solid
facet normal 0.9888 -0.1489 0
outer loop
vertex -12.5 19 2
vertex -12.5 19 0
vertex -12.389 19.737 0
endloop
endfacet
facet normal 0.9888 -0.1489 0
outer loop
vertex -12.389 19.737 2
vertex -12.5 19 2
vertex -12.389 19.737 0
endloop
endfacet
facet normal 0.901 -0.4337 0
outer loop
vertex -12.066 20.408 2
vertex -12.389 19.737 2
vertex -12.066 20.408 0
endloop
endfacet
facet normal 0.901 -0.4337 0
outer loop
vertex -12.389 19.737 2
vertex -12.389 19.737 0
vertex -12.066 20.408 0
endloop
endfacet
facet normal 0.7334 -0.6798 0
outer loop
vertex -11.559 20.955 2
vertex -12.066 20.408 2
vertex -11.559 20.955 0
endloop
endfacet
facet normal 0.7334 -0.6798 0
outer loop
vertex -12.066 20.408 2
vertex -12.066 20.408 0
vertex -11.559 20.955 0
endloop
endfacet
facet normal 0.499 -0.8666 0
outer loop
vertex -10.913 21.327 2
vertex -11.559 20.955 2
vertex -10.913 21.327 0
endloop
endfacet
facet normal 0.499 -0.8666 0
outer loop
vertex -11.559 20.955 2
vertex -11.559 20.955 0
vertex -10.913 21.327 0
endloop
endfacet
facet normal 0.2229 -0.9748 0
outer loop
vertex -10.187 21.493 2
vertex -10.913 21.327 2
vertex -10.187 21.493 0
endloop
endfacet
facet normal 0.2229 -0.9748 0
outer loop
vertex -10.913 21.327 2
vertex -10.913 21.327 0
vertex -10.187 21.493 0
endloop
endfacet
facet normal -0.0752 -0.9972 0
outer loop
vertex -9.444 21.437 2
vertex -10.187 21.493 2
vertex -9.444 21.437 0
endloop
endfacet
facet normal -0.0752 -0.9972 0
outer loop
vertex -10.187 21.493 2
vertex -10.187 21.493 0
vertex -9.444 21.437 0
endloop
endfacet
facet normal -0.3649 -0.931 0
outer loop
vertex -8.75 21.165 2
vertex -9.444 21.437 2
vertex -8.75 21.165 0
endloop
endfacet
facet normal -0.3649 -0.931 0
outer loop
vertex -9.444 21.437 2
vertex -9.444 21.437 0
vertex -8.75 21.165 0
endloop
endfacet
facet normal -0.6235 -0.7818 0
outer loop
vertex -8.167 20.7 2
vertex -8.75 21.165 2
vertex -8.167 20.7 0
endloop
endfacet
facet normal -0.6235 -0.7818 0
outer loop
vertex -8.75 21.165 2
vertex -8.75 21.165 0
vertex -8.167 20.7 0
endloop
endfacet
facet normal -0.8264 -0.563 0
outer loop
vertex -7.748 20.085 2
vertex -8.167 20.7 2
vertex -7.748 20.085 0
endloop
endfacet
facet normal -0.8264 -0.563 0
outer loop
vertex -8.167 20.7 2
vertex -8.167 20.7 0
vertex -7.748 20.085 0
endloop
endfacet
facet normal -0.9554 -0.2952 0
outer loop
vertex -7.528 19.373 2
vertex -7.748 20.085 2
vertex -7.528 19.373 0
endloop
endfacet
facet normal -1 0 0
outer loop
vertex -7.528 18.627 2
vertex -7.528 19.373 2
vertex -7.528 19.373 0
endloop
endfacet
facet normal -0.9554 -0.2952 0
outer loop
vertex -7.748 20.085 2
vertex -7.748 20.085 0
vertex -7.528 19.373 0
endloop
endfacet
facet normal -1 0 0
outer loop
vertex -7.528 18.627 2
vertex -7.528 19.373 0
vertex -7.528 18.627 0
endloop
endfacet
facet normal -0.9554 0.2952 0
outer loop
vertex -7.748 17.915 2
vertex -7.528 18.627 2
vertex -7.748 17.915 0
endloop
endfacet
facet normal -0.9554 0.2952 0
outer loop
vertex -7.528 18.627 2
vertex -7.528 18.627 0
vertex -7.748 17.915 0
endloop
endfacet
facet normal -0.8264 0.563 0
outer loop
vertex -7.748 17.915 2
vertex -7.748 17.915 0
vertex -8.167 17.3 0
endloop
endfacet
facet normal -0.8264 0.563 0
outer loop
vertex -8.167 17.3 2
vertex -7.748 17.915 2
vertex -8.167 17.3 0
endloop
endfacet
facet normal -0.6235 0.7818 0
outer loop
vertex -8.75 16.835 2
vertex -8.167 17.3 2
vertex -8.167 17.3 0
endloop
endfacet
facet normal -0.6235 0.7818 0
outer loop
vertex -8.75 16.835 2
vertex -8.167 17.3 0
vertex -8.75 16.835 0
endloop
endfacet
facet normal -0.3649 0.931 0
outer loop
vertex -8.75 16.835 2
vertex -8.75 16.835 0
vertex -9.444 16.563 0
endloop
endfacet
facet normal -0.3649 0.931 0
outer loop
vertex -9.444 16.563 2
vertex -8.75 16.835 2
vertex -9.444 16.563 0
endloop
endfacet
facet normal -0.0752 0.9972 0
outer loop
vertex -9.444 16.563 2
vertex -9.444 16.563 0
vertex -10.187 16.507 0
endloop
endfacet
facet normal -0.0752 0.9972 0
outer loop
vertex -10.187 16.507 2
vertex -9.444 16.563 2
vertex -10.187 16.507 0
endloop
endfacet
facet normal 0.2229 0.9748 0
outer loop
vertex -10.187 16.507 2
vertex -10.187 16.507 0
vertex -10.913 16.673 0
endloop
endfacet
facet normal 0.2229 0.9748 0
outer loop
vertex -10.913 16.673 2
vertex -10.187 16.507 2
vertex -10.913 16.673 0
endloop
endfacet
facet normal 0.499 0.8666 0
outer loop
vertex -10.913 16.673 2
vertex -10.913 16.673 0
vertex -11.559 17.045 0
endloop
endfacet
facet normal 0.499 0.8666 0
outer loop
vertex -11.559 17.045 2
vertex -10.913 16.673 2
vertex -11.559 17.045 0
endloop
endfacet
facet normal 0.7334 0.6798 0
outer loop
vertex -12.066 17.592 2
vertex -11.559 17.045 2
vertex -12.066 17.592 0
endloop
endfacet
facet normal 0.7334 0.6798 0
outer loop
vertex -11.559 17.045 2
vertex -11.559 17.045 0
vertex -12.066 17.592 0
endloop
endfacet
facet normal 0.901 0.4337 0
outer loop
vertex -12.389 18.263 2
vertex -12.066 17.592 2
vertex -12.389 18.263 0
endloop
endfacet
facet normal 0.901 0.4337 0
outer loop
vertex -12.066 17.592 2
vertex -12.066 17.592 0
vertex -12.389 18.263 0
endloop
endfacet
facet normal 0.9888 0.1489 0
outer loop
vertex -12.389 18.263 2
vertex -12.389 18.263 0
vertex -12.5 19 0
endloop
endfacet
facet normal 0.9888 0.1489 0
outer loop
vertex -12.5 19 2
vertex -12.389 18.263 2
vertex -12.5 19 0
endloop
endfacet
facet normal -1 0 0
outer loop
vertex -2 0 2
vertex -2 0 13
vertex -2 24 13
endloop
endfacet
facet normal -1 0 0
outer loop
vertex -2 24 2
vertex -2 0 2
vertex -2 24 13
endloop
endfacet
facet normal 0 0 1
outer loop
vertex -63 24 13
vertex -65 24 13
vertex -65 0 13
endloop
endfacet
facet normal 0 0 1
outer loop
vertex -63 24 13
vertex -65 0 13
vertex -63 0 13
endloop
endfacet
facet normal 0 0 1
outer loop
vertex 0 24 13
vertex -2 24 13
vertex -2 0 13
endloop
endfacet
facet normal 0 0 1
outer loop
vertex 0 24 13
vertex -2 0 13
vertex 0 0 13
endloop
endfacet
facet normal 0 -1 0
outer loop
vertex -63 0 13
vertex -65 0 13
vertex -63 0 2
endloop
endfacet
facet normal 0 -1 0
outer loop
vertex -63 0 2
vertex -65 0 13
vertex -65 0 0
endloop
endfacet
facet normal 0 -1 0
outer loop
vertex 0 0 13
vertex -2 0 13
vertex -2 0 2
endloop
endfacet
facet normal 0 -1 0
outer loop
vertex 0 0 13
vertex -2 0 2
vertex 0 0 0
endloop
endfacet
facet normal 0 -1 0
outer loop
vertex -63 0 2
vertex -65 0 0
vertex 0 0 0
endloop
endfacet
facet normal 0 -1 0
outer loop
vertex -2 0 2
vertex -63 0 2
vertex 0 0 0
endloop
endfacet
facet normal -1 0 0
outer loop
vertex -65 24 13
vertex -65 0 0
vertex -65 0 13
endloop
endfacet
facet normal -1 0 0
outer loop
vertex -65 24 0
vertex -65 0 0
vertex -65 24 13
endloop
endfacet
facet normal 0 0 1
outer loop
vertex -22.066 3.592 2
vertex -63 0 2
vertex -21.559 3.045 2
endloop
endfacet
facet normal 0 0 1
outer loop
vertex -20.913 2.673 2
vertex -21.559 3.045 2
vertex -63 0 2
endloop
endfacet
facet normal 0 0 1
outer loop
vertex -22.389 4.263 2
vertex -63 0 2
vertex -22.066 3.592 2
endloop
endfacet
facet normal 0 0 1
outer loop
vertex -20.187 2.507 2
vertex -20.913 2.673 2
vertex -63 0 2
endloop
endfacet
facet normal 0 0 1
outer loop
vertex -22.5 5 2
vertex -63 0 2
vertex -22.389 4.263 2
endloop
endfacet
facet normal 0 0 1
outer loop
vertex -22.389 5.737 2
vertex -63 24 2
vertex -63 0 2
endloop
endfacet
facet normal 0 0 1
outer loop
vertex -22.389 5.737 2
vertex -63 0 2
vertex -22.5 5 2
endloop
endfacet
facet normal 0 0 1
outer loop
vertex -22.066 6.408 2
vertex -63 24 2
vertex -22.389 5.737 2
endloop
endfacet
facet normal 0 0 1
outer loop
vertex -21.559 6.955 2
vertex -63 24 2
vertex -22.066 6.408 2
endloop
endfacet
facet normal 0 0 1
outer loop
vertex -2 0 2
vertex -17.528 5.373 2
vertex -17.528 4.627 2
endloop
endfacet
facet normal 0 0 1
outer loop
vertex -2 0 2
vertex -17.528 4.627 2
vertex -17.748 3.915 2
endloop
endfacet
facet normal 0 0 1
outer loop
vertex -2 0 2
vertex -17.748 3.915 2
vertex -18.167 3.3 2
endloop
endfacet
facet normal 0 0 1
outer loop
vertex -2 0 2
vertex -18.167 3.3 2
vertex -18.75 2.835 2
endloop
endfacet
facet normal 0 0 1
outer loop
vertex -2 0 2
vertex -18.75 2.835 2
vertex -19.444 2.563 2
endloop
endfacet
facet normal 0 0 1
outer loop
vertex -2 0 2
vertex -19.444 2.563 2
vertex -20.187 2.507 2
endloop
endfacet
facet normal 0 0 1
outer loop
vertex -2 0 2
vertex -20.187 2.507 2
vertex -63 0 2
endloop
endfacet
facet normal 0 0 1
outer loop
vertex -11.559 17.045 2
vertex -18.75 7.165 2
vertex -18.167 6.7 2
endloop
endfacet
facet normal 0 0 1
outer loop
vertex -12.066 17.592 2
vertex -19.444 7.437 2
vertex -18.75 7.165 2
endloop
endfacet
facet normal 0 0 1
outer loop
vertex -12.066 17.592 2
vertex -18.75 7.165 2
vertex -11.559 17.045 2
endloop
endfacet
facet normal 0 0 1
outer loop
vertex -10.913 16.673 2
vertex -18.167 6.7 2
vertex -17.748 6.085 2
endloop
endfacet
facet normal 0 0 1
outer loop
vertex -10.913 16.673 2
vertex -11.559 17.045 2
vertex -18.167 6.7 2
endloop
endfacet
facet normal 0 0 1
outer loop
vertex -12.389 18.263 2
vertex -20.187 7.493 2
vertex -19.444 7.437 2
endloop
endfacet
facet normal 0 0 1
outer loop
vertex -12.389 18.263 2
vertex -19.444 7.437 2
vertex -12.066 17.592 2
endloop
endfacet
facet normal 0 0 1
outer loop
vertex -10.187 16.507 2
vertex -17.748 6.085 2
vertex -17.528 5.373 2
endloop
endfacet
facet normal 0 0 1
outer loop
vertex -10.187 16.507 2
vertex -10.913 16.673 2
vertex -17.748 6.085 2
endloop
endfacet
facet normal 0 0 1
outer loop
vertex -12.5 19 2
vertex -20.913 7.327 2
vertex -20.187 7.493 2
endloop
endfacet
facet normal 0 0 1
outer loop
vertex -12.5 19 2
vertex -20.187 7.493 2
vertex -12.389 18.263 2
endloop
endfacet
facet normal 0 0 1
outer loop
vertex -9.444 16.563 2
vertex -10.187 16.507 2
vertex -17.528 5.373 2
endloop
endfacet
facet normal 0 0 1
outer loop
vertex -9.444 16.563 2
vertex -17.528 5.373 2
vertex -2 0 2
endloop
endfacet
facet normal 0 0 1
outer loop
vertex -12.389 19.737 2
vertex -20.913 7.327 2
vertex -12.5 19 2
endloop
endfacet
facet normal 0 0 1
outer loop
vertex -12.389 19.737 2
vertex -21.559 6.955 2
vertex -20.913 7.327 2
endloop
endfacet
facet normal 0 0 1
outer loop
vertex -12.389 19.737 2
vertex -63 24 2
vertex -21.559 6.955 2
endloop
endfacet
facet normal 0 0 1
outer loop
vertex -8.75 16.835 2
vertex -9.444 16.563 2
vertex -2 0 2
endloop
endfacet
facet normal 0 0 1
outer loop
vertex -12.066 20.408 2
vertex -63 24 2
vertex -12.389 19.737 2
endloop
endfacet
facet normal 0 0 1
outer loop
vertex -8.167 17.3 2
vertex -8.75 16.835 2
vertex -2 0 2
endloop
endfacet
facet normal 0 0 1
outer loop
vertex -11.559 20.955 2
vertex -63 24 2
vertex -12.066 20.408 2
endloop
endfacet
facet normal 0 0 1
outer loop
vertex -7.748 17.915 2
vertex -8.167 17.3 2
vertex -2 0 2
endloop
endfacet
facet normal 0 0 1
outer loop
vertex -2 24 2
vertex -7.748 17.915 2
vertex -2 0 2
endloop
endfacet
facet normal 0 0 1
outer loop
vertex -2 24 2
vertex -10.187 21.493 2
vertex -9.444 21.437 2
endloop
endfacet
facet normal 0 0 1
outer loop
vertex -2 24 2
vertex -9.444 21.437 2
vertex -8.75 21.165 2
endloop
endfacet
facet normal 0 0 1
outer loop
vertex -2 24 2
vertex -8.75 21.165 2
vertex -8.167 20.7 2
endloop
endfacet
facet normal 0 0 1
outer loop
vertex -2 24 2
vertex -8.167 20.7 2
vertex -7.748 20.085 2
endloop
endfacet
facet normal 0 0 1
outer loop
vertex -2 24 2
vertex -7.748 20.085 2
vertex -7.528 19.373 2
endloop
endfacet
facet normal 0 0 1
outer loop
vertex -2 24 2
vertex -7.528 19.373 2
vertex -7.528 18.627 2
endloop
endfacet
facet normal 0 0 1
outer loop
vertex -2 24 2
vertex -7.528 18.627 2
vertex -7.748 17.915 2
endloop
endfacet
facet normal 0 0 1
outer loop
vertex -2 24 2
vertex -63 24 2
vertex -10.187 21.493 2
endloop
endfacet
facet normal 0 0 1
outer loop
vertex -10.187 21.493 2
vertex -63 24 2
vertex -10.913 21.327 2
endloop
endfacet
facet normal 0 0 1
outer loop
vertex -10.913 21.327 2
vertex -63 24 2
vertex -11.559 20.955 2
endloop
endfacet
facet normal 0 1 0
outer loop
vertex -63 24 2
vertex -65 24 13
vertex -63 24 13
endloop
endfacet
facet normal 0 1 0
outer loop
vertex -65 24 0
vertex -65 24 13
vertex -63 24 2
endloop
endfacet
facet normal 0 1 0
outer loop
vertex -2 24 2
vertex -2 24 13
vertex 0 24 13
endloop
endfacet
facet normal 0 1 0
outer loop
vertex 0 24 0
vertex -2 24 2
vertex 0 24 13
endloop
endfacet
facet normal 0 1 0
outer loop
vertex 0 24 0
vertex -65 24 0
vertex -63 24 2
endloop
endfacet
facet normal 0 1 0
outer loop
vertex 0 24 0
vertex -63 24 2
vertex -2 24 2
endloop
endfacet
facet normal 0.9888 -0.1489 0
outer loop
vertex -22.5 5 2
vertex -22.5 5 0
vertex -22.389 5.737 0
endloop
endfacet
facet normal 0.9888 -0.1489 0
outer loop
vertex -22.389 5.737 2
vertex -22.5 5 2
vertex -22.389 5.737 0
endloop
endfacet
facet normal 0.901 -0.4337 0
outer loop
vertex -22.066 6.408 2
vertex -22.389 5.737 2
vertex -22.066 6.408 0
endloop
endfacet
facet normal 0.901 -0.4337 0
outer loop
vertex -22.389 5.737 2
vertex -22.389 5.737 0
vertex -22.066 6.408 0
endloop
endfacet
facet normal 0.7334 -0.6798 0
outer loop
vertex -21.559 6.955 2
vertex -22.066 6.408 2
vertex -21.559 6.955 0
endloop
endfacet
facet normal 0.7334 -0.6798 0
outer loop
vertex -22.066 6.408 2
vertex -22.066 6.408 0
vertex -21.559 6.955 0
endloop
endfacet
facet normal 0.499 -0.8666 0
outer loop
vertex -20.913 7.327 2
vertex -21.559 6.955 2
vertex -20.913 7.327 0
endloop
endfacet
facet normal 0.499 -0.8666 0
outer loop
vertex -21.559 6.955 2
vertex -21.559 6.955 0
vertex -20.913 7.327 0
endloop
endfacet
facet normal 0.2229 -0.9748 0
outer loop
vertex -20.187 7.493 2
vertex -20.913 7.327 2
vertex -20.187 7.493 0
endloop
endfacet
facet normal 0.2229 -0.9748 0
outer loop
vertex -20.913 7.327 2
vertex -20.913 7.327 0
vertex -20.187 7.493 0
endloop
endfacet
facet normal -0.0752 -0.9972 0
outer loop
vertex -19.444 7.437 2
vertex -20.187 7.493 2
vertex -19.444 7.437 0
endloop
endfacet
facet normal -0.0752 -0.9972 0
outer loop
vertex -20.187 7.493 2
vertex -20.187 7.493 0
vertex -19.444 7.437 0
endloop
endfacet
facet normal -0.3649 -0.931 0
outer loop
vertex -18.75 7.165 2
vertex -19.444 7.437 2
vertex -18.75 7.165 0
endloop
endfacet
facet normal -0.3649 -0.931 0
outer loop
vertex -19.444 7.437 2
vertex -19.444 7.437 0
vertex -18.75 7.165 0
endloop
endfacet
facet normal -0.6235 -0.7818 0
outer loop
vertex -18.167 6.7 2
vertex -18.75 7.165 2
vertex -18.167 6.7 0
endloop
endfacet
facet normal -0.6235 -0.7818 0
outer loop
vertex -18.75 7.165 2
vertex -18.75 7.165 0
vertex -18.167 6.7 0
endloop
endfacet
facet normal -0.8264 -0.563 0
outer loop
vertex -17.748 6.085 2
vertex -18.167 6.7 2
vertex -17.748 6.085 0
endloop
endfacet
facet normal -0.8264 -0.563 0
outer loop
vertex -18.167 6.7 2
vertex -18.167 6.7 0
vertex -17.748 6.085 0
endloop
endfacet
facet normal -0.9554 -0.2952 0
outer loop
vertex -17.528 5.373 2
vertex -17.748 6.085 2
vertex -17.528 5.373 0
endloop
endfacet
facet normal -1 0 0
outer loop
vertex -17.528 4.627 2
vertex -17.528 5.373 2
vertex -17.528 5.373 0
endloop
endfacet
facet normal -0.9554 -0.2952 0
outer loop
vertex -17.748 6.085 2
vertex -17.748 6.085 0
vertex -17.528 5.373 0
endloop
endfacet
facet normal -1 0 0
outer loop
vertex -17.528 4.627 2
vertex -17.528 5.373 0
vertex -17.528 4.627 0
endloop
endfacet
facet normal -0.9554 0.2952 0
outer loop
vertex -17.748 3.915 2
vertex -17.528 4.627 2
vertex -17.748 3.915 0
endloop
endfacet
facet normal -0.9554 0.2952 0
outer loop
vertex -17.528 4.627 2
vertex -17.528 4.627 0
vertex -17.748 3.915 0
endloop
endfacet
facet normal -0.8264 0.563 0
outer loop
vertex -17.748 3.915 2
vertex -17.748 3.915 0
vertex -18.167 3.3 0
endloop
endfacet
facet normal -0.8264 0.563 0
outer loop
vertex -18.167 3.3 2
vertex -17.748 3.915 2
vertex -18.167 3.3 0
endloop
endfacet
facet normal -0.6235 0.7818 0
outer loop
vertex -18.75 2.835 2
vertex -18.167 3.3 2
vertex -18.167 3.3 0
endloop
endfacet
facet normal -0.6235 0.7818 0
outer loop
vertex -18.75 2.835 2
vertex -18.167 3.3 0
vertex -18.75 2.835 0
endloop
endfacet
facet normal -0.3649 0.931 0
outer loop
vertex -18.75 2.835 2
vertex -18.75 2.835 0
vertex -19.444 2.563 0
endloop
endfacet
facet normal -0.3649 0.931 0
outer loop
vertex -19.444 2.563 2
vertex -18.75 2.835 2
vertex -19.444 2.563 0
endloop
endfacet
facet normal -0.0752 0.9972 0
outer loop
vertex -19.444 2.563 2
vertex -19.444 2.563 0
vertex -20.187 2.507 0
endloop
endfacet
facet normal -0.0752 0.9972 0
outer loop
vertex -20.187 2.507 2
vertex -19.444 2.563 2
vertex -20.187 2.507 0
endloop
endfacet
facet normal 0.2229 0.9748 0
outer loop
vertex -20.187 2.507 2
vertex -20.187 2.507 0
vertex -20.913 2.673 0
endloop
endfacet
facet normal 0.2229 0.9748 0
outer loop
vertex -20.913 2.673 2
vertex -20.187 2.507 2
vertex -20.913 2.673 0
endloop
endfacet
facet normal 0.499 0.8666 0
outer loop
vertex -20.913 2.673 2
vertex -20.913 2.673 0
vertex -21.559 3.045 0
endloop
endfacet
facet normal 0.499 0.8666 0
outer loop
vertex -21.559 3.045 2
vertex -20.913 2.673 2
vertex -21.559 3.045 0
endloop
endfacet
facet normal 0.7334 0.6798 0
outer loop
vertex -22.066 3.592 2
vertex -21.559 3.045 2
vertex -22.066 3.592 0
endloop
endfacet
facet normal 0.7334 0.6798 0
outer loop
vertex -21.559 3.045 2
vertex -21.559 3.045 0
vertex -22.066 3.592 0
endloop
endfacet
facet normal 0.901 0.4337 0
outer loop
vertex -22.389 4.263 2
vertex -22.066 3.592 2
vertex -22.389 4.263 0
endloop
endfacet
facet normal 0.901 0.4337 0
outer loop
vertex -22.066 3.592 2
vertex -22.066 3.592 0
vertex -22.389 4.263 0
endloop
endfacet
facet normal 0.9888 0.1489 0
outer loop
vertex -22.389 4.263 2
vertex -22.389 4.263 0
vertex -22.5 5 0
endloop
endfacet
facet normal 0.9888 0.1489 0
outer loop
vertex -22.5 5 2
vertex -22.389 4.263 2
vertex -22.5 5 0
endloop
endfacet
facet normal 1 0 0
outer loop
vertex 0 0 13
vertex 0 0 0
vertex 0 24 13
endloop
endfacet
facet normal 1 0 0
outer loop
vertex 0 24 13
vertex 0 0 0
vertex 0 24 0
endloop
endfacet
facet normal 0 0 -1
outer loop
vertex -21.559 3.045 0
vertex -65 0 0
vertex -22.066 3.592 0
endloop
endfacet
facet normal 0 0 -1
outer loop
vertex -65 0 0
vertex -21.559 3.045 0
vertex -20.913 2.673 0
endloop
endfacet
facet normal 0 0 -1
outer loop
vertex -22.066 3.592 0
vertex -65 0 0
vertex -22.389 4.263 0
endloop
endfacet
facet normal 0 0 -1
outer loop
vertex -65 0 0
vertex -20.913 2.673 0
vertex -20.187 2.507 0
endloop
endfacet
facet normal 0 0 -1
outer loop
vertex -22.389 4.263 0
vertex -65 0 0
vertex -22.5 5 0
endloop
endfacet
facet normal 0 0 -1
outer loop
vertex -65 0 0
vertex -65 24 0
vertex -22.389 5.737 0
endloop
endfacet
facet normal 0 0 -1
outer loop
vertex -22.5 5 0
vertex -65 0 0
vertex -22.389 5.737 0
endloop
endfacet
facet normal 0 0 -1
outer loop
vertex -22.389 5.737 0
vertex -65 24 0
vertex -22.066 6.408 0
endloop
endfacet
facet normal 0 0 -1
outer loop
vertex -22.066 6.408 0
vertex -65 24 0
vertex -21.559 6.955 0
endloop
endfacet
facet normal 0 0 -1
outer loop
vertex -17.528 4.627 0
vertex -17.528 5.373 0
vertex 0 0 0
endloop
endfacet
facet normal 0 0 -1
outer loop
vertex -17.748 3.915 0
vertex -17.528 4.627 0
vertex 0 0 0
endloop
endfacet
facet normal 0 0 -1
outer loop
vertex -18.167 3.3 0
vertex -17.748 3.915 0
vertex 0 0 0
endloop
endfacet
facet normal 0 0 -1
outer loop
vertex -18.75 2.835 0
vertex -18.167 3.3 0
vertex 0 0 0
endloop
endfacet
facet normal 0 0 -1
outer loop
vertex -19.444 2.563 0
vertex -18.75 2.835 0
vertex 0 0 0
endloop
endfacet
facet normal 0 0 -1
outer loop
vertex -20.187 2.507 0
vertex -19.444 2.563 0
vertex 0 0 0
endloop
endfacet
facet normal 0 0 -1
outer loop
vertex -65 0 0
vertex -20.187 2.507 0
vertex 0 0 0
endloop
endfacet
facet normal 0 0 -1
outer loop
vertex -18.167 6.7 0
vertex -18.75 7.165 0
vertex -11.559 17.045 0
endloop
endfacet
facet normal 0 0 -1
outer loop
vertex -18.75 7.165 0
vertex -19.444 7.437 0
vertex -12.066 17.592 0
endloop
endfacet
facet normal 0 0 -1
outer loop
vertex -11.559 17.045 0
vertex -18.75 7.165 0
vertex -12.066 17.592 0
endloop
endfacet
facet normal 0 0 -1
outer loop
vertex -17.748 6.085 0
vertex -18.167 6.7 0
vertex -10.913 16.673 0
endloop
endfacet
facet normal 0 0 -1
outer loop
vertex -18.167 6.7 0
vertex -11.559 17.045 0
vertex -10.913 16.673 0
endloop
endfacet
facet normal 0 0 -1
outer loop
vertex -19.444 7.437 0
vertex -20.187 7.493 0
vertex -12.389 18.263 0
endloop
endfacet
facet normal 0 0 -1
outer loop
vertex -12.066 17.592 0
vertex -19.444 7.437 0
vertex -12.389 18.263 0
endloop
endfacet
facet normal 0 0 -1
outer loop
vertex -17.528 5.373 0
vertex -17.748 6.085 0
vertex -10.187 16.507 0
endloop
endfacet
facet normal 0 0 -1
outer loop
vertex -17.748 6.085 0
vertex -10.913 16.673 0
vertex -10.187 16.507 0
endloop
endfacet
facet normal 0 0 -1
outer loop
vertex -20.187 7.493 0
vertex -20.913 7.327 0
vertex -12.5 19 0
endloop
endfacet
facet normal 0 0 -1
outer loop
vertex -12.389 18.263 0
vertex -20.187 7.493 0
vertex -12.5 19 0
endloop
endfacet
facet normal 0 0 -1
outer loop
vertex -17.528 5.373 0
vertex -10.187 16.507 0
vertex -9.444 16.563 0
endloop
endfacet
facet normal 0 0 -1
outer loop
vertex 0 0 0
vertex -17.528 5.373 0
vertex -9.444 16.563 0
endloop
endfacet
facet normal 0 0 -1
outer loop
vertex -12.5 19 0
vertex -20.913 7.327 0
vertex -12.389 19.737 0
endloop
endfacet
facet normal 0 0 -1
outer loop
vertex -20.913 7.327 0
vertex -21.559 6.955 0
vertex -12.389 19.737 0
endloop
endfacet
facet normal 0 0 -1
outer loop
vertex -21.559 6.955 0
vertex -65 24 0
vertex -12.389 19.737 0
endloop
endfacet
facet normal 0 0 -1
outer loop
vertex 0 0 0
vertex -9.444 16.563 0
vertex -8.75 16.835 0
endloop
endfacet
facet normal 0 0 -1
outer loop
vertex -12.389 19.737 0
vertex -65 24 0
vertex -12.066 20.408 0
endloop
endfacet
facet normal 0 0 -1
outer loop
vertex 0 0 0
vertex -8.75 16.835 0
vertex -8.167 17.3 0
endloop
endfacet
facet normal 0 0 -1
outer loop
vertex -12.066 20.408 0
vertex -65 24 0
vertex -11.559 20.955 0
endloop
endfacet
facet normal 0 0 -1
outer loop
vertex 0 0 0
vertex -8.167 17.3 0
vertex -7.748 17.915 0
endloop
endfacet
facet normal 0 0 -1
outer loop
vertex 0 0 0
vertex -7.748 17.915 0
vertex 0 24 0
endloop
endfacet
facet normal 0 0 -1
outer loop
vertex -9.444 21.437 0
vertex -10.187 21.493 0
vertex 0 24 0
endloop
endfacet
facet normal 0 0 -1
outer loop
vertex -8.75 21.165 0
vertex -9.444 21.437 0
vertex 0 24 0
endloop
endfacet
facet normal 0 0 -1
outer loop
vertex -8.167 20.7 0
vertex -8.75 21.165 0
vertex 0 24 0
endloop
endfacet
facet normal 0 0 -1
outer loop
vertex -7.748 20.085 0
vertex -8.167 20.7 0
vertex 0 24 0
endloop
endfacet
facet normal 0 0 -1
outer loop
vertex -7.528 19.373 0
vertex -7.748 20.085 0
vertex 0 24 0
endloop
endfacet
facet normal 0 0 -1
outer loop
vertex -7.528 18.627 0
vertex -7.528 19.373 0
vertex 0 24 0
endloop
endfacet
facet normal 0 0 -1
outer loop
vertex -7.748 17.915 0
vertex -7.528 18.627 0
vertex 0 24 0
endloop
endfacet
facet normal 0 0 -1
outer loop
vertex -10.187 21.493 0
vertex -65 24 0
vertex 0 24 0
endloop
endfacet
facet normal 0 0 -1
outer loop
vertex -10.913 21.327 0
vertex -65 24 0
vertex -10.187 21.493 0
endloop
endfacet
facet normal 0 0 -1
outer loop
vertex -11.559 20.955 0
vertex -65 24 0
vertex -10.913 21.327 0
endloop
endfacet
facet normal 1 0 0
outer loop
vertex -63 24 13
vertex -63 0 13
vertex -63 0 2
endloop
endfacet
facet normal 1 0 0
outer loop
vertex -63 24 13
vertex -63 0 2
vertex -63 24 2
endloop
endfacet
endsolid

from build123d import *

# Parameters (mm, degrees)
SKETCH_1_W          = 65
SKETCH_1_H          = 24
EXTRUDE_1_DEPTH     = 13
SKETCH_2_W          = 61
SKETCH_2_H          = 24
CUT_EXTRUDE_1_DEPTH = 11
SKETCH_14_R         = 2.5
CUT_EXTRUDE_2_DEPTH = 2


with BuildPart() as part:
    # 草圖1 → 填料-伸長1 (new body)
    with BuildSketch(Plane.XY):
        with Locations((-32.5, 12)):
            Rectangle(SKETCH_1_W, SKETCH_1_H)
    extrude(amount=EXTRUDE_1_DEPTH)

    # 草圖2 → 除料-伸長1 (cut)
    with BuildSketch(Plane.XY.offset(13)):
        with Locations((-32.5, 12)):
            Rectangle(SKETCH_2_W, SKETCH_2_H)
    extrude(amount=-CUT_EXTRUDE_1_DEPTH, mode=Mode.SUBTRACT)

    # 草圖14 → 除料-伸長2 (cut)
    with BuildSketch(Plane(origin=(0, 0, 0), x_dir=(-1, 0, 0), z_dir=(0, 0, -1))):
        with Locations((10, 19)):
            Circle(SKETCH_14_R)
        with Locations((20, 5)):
            Circle(SKETCH_14_R)
    extrude(amount=-CUT_EXTRUDE_2_DEPTH, mode=Mode.SUBTRACT)


solid = part.part
